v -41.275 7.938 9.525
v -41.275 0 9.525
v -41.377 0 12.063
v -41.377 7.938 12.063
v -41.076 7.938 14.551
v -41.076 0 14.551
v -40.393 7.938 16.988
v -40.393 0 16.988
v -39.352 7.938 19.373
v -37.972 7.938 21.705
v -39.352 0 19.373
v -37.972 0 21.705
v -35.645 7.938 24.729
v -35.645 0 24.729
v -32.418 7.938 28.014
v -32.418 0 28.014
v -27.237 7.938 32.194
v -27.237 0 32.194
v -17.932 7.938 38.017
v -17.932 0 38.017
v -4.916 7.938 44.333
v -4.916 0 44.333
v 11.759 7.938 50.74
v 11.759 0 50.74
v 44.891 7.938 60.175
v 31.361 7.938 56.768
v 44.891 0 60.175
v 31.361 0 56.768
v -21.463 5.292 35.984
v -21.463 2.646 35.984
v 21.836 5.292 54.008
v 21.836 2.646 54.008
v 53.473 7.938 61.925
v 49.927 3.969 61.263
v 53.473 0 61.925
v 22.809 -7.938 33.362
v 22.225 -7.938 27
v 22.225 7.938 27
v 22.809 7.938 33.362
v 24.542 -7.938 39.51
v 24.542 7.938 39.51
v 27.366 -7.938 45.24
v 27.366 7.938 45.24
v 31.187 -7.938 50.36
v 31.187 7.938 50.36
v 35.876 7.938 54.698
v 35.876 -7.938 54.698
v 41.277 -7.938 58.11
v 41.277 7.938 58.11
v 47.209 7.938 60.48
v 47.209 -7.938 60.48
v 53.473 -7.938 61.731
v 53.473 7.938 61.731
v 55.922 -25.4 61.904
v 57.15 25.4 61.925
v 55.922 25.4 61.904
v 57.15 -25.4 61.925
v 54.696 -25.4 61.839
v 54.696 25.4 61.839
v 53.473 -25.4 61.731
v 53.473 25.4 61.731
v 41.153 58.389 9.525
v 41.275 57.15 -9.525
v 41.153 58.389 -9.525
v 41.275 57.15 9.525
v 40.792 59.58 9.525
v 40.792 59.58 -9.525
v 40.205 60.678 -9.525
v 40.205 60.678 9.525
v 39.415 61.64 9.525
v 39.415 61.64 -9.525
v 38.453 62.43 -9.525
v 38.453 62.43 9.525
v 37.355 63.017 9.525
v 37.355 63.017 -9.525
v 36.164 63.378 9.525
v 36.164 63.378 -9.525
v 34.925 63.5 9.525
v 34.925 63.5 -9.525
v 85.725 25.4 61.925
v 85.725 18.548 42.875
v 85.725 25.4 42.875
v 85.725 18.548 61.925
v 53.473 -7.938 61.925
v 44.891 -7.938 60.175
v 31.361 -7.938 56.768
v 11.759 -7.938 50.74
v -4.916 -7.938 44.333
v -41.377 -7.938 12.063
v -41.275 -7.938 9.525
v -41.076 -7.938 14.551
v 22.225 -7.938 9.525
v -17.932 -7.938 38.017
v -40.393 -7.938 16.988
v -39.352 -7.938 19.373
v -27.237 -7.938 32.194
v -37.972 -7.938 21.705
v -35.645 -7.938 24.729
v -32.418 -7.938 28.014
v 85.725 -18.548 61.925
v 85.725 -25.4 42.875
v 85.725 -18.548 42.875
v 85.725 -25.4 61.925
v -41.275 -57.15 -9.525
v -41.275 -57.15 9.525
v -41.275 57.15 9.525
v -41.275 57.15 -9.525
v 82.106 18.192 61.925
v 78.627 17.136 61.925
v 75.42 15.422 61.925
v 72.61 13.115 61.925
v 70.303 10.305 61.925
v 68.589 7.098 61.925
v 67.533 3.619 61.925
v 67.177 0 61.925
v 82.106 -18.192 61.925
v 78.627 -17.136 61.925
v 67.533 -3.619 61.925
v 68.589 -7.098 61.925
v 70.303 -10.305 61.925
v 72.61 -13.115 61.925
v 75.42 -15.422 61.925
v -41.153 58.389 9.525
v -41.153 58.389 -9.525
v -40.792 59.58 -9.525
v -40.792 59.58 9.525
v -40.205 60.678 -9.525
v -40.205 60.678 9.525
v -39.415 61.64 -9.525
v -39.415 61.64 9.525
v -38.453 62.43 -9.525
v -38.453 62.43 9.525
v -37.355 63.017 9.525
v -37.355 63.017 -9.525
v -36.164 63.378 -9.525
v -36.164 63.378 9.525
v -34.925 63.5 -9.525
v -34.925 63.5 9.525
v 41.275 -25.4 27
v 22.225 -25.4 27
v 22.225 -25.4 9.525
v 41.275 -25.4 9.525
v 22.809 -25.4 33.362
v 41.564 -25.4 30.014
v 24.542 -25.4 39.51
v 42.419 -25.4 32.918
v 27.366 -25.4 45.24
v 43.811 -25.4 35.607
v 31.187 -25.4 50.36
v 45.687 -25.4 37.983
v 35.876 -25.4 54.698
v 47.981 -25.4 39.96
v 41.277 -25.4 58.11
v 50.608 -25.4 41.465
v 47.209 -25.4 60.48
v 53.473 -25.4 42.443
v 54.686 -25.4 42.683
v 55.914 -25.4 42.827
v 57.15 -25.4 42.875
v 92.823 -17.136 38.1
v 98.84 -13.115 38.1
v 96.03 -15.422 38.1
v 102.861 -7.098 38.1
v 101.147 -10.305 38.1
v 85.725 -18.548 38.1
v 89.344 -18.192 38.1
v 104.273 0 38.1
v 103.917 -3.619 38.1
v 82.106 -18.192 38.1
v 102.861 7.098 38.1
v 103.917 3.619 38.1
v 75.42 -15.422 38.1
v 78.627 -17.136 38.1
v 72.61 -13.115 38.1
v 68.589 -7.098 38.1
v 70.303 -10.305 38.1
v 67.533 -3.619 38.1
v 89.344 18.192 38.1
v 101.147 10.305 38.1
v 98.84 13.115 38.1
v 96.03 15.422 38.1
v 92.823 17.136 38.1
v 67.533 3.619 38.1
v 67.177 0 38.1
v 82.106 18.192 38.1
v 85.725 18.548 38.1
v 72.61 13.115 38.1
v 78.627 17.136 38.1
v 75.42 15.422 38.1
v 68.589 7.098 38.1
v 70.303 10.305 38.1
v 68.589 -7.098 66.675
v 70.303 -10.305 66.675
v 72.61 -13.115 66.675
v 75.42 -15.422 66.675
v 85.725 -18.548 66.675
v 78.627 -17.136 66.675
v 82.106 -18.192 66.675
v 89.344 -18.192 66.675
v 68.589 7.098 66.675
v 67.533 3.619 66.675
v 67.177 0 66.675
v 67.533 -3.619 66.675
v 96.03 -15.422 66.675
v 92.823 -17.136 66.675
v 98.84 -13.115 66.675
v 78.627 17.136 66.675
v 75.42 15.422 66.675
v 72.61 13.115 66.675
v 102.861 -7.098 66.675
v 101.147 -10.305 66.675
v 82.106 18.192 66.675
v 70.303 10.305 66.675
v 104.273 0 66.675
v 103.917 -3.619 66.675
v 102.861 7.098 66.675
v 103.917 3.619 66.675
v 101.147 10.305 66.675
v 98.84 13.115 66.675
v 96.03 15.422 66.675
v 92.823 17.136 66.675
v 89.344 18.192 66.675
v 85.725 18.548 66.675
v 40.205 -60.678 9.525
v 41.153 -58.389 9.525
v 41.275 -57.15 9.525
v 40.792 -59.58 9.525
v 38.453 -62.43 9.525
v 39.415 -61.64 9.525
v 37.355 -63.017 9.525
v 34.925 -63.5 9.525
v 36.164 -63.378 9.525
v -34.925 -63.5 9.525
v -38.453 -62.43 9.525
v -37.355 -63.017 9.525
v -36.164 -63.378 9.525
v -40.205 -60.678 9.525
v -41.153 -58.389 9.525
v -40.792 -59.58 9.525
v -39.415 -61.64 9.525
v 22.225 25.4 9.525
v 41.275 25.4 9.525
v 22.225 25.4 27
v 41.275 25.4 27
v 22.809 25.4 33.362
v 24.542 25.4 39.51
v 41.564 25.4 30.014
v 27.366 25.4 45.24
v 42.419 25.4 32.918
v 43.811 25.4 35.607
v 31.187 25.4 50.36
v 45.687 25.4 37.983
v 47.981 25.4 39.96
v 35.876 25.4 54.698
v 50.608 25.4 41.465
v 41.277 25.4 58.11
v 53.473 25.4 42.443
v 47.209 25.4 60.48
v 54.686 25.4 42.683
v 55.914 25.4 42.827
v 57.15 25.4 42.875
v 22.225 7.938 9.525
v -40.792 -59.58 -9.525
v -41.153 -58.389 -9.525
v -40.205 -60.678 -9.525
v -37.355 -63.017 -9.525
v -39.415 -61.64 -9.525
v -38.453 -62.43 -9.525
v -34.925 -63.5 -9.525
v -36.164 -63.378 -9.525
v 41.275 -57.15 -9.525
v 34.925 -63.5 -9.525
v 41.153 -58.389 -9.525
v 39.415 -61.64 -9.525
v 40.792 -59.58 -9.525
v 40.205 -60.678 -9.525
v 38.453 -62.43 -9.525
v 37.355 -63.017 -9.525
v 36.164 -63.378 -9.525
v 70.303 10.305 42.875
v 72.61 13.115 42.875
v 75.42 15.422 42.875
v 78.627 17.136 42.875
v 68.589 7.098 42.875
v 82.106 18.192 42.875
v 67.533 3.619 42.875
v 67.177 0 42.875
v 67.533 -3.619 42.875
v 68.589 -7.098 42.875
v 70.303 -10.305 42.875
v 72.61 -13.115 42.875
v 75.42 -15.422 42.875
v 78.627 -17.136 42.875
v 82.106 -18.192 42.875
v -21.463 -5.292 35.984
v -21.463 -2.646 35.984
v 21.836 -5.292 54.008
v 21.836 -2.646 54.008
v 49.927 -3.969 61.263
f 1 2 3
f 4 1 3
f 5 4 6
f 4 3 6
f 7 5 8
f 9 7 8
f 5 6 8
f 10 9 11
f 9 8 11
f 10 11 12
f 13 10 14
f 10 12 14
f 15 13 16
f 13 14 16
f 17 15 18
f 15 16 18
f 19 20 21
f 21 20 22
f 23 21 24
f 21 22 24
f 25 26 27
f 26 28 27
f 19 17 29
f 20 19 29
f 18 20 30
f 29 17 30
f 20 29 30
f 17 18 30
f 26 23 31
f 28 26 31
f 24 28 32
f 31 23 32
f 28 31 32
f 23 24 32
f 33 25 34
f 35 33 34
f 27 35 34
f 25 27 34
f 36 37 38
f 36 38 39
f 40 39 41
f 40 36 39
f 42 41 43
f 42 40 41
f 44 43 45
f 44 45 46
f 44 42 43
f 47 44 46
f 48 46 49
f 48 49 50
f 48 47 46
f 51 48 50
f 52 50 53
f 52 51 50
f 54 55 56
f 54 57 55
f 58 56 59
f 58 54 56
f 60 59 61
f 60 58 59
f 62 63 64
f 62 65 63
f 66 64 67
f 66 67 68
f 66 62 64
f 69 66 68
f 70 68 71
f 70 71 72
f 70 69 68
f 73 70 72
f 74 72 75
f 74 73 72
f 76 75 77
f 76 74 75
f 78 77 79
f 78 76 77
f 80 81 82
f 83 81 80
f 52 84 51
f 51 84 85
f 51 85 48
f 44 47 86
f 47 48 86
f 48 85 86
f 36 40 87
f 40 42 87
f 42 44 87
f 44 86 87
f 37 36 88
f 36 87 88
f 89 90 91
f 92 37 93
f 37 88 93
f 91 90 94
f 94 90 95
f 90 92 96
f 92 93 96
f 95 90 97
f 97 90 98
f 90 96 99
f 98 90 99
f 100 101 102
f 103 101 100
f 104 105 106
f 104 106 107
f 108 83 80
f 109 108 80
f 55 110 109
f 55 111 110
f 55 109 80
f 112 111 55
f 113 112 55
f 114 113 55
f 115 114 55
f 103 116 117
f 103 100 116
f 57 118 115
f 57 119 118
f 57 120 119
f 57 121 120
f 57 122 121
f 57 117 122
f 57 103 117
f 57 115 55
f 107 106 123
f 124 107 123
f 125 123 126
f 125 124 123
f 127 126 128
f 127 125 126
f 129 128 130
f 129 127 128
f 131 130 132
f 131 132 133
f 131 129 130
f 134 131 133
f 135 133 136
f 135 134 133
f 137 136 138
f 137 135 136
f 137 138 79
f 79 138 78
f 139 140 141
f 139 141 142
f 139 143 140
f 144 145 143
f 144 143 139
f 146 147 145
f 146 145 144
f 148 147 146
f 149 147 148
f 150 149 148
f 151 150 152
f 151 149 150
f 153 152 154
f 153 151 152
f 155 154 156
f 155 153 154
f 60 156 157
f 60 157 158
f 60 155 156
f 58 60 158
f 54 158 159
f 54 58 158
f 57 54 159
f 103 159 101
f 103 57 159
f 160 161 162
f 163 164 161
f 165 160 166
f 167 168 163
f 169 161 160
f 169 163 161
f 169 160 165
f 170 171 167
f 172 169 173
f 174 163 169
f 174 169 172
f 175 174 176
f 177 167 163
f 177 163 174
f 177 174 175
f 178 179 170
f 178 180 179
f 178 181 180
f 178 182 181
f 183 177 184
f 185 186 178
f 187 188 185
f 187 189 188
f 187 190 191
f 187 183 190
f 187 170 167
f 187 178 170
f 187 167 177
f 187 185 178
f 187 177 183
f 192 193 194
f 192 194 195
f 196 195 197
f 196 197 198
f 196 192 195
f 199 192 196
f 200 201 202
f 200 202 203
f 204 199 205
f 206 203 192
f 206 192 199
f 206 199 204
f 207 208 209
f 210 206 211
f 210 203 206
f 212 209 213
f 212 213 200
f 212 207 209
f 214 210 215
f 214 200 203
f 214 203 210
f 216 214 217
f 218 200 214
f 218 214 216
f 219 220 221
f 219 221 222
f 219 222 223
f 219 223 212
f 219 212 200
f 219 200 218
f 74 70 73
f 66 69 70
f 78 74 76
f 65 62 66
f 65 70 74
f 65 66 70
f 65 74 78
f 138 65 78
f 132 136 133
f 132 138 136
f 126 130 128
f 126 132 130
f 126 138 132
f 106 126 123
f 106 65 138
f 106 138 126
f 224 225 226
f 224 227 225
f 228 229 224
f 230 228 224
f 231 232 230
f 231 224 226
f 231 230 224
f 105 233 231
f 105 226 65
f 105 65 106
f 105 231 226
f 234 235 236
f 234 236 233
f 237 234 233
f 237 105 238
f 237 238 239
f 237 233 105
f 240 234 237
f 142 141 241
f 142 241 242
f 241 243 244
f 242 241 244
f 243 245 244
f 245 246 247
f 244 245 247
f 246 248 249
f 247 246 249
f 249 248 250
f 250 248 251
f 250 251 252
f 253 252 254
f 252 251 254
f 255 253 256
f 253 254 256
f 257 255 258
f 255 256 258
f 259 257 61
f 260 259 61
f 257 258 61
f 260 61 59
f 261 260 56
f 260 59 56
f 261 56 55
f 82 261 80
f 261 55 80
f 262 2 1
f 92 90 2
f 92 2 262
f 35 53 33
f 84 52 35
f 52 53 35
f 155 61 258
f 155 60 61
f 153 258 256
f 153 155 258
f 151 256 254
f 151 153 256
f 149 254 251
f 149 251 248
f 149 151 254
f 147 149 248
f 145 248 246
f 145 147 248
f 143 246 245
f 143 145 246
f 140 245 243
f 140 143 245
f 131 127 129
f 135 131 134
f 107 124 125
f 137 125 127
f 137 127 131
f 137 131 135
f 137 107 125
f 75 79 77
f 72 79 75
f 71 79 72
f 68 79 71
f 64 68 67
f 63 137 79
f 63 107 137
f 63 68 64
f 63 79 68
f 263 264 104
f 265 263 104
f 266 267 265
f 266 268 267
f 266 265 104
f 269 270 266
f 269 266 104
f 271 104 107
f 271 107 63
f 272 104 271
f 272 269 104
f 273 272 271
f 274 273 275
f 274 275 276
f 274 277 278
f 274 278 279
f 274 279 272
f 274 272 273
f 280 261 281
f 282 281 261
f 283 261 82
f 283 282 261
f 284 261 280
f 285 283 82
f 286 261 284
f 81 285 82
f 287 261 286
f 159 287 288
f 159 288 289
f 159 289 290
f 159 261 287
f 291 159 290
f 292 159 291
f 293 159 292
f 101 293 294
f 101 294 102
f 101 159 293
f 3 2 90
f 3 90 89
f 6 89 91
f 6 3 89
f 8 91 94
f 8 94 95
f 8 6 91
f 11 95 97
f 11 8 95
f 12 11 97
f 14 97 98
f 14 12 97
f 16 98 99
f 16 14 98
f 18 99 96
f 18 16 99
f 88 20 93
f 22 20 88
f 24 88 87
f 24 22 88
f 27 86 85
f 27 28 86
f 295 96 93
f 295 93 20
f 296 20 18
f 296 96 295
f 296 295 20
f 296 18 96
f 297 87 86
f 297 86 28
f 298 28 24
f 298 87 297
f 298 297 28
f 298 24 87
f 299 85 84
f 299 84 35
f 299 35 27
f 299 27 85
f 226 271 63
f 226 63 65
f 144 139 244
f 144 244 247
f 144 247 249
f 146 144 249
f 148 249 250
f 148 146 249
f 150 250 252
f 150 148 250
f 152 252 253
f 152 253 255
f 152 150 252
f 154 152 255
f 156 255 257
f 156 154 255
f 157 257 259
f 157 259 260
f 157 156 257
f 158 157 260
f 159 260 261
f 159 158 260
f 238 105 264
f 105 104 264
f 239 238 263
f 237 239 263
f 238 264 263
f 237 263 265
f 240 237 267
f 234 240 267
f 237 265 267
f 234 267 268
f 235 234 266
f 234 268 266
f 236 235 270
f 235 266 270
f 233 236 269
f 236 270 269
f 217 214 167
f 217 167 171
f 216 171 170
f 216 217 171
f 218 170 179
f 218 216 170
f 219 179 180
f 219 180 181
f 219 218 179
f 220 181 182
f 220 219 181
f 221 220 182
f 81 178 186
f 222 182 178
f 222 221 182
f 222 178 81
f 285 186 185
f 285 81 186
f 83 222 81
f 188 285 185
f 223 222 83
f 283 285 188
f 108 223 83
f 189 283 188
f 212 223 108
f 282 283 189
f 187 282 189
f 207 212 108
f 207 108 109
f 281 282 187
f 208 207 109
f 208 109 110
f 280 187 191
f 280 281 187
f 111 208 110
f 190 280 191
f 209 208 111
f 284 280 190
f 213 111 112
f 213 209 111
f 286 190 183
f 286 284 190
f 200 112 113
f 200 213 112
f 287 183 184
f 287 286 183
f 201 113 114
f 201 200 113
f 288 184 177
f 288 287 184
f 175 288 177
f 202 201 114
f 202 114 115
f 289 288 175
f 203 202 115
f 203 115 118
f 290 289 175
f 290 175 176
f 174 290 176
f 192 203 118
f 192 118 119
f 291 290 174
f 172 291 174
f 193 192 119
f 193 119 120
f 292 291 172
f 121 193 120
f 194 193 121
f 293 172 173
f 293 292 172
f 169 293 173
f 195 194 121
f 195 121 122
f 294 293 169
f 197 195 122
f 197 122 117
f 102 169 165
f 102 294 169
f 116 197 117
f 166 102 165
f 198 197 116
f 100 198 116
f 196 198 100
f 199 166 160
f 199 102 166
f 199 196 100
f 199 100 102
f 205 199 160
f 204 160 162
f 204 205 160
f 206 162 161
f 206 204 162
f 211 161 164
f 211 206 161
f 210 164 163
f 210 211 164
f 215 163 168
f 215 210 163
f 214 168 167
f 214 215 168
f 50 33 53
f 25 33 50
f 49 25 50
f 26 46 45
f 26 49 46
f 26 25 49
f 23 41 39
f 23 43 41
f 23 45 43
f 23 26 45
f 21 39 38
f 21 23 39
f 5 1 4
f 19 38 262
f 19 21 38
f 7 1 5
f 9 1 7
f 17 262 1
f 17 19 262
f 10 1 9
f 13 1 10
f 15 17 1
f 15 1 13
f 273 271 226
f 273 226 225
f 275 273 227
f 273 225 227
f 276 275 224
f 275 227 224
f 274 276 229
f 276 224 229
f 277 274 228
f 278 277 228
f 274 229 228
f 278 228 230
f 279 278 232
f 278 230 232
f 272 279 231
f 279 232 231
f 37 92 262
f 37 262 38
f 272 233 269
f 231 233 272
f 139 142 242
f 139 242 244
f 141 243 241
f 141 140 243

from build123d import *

# Parameters (mm, degrees)
F1_DEPTH = 63.5
F2_DEPTH = 25.4
F3_DEPTH = 7.9375
F5_R     = 6.35


with BuildPart() as f1:
    # F0 (on Front) → F1 (new body, symmetric)
    with BuildSketch(Plane.XZ):
        Polygon((22.225, 9.525), (-41.275, 9.525), (-41.275, -9.525), (41.275, -9.525), (41.275, 9.525), align=None)
    extrude(amount=F1_DEPTH, both=True)

    # F5
    f5_edges = [f1.edges().sort_by_distance(p)[0] for p in [
        (-41.275, -63.5, 0),
        (41.275, -63.5, 0),
        (41.275, 63.5, 0),
        (-41.275, 63.5, 0),
    ]]
    fillet(f5_edges, radius=F5_R)


with BuildPart() as f2:
    # F0 (on Front) → F2 (new body, symmetric)
    with BuildSketch(Plane.XZ):
        with BuildLine():
            Line((22.225, 27.0002), (22.225, 9.525))
            Line((22.225, 9.525), (41.275, 9.525))
            Line((41.275, 9.525), (41.275, 27.0002))
            ThreePointArc((41.275, 27.0002), (44.6923096771, 36.839995568), (53.4729939301, 42.4434914679))
            Line((53.4729939301, 42.4434914679), (53.4729939301, 61.7310976469))
            ThreePointArc((53.4729939301, 61.7310976469), (31.1868042992, 50.3597396788), (22.225, 27.0002))
        make_face()
        with BuildLine():
            ThreePointArc((57.15, 61.9252), (55.308937171, 61.8766406535), (53.4729939301, 61.7310976469))
            Line((53.4729939301, 61.7310976469), (53.4729939301, 42.4434914679))
            ThreePointArc((53.4729939301, 42.4434914679), (55.2988688664, 42.7669034768), (57.15, 42.8752))
            Line((57.15, 42.8752), (85.725, 42.8752))
            Line((85.725, 42.8752), (85.725, 61.9252))
            Line((85.725, 61.9252), (57.15, 61.9252))
        make_face()
    extrude(amount=F2_DEPTH, both=True)

    # F0 (on Front) → F4 (revolve)
    with BuildSketch(Plane.XZ):
        Polygon((104.2729939301, 66.675), (85.725, 66.675), (85.725, 61.9252), (85.725, 42.8752), (85.725, 38.1), (104.2729939301, 38.1), align=None)
    revolve(axis=Axis((85.725, 0, 52.4002), (0, 0, 1)))


with BuildPart() as f3:
    # F0 (on Front) → F3 (new body, symmetric)
    with BuildSketch(Plane.XZ):
        with BuildLine():
            add(Edge.make_bspline(
                [(-41.275, 9.525), (-44.9225865304, 39.6453738213), (39.3824249662, 59.6179837101), (53.4729939301, 61.9252)],
                knots=[0, 0, 0, 0, 0.8443919966, 0.8443919966, 0.8443919966, 0.8443919966], degree=3))
            Line((-41.275, 9.525), (22.225, 9.525))
            Line((22.225, 9.525), (22.225, 27.0002))
            ThreePointArc((22.225, 27.0002), (31.1868042992, 50.3597396788), (53.4729939301, 61.7310976469))
            Line((53.4729939301, 61.7310976469), (53.4729939301, 61.9252))
        make_face()
    extrude(amount=F3_DEPTH, both=True)


solid = Compound([f1.part, f2.part, f3.part])
